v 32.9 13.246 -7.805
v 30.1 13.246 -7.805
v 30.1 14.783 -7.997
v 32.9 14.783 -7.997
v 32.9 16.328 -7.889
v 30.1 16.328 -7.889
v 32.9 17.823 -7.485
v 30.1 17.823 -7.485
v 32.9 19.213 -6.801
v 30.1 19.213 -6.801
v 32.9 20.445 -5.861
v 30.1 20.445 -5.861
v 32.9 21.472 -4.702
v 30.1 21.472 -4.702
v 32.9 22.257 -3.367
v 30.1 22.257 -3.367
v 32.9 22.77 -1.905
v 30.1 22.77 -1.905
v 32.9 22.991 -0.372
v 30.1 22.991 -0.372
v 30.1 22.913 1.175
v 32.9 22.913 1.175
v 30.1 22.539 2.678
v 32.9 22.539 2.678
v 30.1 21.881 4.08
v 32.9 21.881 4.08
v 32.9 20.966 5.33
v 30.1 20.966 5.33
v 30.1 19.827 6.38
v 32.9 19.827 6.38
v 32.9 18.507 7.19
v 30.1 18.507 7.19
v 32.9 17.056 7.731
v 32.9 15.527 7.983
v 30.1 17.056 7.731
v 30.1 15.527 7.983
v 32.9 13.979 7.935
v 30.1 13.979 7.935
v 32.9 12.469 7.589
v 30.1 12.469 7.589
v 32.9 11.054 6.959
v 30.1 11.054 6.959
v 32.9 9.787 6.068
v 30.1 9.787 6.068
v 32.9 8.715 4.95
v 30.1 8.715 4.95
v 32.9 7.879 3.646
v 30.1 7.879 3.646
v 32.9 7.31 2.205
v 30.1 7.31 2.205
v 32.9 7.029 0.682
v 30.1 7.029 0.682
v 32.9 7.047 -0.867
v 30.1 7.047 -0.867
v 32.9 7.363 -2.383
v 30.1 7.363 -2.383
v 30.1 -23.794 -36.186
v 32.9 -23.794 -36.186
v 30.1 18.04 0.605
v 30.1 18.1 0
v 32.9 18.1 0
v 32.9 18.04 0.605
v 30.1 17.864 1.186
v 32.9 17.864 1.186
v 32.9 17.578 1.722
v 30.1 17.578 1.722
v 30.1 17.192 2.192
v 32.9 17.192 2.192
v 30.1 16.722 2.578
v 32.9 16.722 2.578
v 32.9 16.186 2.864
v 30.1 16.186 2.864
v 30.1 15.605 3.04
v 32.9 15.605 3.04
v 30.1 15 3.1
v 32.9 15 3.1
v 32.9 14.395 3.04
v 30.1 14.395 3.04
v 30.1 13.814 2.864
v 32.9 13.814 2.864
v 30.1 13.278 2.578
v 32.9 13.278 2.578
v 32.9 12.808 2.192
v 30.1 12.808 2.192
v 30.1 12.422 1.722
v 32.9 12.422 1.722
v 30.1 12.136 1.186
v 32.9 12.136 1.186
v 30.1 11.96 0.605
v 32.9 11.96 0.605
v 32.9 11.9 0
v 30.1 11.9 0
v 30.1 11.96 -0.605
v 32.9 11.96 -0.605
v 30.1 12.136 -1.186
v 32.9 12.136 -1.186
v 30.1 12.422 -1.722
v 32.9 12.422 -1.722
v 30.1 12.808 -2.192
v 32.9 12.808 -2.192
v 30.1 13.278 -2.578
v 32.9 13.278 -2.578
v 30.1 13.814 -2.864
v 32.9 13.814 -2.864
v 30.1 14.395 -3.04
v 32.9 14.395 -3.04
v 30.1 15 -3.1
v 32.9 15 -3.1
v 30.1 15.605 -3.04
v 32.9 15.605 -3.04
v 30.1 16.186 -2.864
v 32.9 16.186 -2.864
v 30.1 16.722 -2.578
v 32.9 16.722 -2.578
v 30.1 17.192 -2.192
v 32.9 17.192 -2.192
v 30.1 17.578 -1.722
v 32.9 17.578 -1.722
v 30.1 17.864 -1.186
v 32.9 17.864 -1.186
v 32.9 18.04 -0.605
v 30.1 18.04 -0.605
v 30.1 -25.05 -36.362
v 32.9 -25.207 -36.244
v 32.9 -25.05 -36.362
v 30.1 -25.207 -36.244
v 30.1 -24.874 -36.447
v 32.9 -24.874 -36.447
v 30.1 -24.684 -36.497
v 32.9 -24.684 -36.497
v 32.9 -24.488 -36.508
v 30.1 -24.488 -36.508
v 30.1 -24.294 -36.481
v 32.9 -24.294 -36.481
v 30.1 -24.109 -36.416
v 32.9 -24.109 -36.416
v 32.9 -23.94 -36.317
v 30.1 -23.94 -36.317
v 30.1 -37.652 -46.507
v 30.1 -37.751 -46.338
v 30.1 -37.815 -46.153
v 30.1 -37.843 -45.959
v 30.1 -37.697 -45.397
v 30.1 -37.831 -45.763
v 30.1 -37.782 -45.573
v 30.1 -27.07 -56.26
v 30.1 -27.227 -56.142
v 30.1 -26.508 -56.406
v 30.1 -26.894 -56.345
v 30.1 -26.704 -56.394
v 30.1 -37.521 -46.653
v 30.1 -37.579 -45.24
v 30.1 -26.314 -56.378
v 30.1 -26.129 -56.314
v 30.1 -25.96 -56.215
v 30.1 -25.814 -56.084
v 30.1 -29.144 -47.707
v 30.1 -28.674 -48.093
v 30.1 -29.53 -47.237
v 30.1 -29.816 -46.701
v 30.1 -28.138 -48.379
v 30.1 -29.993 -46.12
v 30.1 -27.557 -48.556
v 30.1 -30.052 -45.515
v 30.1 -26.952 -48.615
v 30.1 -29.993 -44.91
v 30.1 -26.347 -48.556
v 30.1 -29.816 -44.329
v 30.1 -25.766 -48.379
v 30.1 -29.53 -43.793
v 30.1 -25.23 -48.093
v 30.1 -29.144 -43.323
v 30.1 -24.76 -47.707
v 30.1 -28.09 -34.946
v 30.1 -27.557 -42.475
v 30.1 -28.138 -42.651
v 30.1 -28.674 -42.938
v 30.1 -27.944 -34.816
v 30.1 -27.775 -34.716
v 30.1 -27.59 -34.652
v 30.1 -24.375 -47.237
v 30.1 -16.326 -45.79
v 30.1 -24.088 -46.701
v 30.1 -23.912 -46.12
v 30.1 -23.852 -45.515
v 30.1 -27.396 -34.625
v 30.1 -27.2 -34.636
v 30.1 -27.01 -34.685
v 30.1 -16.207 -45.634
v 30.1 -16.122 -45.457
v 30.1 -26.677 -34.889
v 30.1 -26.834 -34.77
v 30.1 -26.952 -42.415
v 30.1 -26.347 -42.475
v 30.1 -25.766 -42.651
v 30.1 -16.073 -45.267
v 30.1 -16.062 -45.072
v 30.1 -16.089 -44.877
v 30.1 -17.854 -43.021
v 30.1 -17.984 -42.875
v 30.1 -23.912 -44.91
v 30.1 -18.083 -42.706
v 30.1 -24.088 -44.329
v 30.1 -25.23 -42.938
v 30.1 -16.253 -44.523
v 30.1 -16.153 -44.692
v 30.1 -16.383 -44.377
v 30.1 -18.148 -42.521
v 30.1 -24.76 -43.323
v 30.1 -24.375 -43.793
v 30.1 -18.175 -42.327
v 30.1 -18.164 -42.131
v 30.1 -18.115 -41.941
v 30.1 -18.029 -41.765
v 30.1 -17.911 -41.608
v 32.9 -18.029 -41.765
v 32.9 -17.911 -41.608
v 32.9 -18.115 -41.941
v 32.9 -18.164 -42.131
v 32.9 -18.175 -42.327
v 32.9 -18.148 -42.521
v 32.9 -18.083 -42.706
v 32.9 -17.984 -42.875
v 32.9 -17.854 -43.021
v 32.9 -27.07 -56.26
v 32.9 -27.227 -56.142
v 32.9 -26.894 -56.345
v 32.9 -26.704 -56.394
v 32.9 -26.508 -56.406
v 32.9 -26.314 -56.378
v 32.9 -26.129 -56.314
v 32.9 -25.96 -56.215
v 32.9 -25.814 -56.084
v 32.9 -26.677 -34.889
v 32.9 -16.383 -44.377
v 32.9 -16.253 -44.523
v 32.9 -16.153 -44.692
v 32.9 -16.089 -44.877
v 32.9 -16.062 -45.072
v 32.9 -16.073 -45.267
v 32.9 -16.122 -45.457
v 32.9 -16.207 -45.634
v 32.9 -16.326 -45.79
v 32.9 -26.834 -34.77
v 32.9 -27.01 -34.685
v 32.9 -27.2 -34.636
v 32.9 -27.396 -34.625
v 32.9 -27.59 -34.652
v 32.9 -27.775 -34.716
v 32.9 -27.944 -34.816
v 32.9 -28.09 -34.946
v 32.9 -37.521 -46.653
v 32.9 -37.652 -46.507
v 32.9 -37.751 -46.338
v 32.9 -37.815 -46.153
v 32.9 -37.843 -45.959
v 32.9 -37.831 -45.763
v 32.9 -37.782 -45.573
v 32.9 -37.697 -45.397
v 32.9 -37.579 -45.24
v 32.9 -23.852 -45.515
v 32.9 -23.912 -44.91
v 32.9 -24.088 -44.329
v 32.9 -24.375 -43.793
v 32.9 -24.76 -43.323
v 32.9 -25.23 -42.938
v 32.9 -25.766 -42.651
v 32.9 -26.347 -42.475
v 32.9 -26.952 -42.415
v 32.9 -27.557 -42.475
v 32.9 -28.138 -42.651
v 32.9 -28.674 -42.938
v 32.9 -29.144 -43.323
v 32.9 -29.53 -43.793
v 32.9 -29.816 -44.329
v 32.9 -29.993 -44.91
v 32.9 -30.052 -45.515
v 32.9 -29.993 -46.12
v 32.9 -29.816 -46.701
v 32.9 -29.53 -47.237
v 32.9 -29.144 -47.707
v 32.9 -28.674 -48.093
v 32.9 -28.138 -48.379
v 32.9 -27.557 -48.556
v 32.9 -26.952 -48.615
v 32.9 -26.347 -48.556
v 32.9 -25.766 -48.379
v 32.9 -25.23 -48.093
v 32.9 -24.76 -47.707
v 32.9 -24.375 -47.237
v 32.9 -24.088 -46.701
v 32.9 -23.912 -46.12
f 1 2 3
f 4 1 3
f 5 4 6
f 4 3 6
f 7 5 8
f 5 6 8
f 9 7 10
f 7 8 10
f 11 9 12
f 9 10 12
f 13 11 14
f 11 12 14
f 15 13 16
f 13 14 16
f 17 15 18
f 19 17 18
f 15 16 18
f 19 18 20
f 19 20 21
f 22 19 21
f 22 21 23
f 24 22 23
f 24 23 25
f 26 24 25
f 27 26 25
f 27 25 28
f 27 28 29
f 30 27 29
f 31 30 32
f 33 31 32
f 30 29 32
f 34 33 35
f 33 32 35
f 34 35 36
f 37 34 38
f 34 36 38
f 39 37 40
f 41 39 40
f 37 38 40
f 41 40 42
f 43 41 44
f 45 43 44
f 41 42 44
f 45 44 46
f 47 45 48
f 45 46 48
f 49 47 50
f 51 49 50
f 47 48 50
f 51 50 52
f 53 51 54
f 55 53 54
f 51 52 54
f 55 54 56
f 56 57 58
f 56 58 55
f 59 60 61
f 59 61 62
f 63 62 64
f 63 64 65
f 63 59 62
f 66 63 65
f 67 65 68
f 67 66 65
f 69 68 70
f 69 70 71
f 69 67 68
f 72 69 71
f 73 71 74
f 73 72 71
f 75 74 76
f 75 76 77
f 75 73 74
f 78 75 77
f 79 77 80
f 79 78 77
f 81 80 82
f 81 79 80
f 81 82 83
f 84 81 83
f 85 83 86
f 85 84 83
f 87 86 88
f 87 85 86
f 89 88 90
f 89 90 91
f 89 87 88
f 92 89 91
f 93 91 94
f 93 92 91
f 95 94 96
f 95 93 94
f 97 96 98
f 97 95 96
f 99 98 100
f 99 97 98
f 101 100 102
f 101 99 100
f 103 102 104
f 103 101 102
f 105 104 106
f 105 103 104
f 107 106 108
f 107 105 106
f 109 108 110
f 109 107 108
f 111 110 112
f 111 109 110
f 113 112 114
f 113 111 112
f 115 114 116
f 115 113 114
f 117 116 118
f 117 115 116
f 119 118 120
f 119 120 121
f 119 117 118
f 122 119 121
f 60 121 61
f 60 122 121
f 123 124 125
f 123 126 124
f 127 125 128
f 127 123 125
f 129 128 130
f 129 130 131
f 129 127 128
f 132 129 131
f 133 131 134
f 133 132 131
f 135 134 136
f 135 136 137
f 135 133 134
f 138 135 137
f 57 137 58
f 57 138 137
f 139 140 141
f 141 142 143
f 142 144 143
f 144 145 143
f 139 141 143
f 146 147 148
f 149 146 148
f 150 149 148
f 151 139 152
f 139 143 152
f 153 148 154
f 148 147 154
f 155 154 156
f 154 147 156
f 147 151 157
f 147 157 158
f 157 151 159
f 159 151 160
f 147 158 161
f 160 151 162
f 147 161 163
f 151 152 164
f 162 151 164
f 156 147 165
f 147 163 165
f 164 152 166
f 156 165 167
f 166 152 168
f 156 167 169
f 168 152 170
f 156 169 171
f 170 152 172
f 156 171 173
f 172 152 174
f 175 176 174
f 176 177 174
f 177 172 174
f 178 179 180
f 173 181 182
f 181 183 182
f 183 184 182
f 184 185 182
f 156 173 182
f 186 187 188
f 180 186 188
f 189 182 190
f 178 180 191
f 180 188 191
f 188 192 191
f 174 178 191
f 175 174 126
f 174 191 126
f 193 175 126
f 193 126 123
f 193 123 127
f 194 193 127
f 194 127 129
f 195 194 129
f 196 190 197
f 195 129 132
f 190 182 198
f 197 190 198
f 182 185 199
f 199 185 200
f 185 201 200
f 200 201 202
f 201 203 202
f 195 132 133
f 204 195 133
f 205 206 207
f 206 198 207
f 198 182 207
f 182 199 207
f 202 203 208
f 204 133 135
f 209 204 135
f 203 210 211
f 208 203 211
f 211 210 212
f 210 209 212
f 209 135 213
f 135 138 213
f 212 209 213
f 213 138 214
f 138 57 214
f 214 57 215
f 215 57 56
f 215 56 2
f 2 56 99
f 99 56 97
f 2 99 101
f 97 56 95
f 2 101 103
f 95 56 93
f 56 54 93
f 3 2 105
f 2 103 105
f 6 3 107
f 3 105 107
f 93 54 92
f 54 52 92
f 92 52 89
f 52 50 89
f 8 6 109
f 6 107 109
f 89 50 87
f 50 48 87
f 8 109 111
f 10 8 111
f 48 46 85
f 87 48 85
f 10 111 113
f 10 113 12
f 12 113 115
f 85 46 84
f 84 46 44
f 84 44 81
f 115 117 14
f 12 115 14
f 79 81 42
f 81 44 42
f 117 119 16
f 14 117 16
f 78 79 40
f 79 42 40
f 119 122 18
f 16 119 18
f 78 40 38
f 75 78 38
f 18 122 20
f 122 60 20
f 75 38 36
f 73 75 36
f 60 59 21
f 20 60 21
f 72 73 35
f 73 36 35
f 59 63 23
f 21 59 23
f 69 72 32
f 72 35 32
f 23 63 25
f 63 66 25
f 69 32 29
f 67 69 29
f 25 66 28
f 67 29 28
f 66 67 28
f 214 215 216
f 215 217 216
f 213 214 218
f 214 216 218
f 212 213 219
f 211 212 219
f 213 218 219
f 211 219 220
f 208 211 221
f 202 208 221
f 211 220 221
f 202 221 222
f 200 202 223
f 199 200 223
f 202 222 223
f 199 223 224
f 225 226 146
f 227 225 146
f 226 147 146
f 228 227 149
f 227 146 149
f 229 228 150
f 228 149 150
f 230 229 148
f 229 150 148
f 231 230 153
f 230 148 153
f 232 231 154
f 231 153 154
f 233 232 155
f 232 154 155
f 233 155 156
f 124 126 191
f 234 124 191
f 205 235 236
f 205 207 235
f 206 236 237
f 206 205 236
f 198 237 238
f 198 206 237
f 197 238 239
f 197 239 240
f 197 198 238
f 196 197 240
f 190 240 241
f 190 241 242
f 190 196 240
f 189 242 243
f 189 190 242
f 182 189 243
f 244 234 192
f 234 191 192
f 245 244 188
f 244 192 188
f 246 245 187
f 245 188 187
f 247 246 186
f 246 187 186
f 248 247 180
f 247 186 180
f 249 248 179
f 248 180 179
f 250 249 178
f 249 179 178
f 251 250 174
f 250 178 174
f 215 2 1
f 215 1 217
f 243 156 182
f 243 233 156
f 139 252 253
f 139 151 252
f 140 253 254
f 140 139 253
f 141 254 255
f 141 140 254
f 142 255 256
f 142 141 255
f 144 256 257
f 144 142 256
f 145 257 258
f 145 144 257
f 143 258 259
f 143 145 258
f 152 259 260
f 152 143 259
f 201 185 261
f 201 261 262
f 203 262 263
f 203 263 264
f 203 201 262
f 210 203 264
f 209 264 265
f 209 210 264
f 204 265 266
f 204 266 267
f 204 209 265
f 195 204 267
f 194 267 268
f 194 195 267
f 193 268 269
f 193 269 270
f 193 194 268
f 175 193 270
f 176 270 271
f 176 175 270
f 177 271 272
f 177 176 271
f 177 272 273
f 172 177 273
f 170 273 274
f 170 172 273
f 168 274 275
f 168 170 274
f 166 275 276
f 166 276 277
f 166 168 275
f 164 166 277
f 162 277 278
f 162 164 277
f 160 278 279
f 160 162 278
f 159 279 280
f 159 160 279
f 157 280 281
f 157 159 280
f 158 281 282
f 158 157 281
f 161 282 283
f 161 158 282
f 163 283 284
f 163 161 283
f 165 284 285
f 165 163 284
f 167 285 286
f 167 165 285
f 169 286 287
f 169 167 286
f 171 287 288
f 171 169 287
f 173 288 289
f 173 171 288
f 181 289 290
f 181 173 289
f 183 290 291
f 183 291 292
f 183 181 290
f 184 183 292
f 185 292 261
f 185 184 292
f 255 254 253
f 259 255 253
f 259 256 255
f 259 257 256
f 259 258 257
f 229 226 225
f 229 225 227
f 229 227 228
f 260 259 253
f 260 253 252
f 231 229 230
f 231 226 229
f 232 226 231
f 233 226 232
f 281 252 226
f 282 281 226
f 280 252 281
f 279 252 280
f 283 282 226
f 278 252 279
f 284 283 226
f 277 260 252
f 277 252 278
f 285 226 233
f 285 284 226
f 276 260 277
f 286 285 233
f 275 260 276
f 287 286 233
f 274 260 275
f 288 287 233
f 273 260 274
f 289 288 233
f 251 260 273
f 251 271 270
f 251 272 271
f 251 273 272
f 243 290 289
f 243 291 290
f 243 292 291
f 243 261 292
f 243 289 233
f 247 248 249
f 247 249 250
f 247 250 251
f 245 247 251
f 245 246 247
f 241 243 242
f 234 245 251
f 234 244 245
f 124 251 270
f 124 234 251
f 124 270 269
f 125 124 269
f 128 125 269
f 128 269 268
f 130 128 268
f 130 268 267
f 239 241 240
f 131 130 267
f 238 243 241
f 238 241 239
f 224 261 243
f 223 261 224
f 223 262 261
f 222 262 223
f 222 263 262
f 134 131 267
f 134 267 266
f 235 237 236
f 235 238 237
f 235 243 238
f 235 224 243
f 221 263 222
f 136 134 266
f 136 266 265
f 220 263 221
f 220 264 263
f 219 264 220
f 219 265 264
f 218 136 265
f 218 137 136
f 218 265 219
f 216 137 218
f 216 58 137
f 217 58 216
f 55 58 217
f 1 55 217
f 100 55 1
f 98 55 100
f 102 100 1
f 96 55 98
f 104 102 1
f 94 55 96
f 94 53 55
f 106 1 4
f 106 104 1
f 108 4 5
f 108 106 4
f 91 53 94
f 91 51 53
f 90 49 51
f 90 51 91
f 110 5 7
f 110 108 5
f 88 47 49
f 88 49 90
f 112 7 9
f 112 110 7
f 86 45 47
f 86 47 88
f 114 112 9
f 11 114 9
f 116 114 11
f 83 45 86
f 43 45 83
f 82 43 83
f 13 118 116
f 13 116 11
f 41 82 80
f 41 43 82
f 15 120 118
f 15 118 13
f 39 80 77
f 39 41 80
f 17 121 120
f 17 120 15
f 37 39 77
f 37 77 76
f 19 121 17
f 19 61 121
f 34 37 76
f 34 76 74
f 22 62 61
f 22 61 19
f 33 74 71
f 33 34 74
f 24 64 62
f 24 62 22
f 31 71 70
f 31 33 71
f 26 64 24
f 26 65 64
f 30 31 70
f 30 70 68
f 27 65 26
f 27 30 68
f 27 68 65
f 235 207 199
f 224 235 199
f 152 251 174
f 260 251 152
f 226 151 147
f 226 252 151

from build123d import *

# Parameters (mm, degrees)
SKETCH047_R  = 3.1
PAD039_DEPTH = 2.8
SKETCH048_R  = 3.1
PAD040_DEPTH = 2.8
FILLET_R     = 1


with BuildPart() as part:
    # Sketch047 (on DatumPlane) → Pad039 (new body)
    with BuildSketch(Plane.YZ.offset(30.1)):
        with BuildLine():
            ThreePointArc((-25.197793, -37.709891), (-32.374027, -51.397583), (-19.31538, -43.131811))
            Line((13.245686, -7.805279), (-19.31538, -43.131811))
            ThreePointArc((13.245686, -7.805279), (20.42192, 5.882413), (7.363273, -2.383359))
            Line((-25.197793, -37.709891), (7.363273, -2.383359))
        make_face()
        with Locations((-26.952107, -45.51517)):
            Circle(SKETCH047_R, mode=Mode.SUBTRACT)
        with Locations((15, 0)):
            Circle(SKETCH047_R, mode=Mode.SUBTRACT)
    extrude(amount=PAD039_DEPTH)

    # Sketch048 (on Face8 of Pad039) → Pad040 (join)
    with BuildSketch(Plane.YZ.offset(32.9)):
        Polygon((-38.25644, -45.975663), (-26.491614, -56.819503), (-15.647774, -45.054677), (-27.4126, -34.210837), align=None)
        with Locations((-26.952107, -45.51517)):
            Circle(SKETCH048_R, mode=Mode.SUBTRACT)
    extrude(amount=-PAD040_DEPTH)

    # Fillet
    fillet_edges = [part.edges().sort_by_distance(p)[0] for p in [
        (31.5, -27.4126, -34.210837),
        (31.5, -38.25644, -45.975663),
        (31.5, -26.491614, -56.819503),
        (31.5, -15.647774, -45.054677),
        (31.5, -18.588981, -42.343717),
        (31.5, -24.471393, -36.921797),
    ]]
    fillet(fillet_edges, radius=FILLET_R)


solid = part.part
